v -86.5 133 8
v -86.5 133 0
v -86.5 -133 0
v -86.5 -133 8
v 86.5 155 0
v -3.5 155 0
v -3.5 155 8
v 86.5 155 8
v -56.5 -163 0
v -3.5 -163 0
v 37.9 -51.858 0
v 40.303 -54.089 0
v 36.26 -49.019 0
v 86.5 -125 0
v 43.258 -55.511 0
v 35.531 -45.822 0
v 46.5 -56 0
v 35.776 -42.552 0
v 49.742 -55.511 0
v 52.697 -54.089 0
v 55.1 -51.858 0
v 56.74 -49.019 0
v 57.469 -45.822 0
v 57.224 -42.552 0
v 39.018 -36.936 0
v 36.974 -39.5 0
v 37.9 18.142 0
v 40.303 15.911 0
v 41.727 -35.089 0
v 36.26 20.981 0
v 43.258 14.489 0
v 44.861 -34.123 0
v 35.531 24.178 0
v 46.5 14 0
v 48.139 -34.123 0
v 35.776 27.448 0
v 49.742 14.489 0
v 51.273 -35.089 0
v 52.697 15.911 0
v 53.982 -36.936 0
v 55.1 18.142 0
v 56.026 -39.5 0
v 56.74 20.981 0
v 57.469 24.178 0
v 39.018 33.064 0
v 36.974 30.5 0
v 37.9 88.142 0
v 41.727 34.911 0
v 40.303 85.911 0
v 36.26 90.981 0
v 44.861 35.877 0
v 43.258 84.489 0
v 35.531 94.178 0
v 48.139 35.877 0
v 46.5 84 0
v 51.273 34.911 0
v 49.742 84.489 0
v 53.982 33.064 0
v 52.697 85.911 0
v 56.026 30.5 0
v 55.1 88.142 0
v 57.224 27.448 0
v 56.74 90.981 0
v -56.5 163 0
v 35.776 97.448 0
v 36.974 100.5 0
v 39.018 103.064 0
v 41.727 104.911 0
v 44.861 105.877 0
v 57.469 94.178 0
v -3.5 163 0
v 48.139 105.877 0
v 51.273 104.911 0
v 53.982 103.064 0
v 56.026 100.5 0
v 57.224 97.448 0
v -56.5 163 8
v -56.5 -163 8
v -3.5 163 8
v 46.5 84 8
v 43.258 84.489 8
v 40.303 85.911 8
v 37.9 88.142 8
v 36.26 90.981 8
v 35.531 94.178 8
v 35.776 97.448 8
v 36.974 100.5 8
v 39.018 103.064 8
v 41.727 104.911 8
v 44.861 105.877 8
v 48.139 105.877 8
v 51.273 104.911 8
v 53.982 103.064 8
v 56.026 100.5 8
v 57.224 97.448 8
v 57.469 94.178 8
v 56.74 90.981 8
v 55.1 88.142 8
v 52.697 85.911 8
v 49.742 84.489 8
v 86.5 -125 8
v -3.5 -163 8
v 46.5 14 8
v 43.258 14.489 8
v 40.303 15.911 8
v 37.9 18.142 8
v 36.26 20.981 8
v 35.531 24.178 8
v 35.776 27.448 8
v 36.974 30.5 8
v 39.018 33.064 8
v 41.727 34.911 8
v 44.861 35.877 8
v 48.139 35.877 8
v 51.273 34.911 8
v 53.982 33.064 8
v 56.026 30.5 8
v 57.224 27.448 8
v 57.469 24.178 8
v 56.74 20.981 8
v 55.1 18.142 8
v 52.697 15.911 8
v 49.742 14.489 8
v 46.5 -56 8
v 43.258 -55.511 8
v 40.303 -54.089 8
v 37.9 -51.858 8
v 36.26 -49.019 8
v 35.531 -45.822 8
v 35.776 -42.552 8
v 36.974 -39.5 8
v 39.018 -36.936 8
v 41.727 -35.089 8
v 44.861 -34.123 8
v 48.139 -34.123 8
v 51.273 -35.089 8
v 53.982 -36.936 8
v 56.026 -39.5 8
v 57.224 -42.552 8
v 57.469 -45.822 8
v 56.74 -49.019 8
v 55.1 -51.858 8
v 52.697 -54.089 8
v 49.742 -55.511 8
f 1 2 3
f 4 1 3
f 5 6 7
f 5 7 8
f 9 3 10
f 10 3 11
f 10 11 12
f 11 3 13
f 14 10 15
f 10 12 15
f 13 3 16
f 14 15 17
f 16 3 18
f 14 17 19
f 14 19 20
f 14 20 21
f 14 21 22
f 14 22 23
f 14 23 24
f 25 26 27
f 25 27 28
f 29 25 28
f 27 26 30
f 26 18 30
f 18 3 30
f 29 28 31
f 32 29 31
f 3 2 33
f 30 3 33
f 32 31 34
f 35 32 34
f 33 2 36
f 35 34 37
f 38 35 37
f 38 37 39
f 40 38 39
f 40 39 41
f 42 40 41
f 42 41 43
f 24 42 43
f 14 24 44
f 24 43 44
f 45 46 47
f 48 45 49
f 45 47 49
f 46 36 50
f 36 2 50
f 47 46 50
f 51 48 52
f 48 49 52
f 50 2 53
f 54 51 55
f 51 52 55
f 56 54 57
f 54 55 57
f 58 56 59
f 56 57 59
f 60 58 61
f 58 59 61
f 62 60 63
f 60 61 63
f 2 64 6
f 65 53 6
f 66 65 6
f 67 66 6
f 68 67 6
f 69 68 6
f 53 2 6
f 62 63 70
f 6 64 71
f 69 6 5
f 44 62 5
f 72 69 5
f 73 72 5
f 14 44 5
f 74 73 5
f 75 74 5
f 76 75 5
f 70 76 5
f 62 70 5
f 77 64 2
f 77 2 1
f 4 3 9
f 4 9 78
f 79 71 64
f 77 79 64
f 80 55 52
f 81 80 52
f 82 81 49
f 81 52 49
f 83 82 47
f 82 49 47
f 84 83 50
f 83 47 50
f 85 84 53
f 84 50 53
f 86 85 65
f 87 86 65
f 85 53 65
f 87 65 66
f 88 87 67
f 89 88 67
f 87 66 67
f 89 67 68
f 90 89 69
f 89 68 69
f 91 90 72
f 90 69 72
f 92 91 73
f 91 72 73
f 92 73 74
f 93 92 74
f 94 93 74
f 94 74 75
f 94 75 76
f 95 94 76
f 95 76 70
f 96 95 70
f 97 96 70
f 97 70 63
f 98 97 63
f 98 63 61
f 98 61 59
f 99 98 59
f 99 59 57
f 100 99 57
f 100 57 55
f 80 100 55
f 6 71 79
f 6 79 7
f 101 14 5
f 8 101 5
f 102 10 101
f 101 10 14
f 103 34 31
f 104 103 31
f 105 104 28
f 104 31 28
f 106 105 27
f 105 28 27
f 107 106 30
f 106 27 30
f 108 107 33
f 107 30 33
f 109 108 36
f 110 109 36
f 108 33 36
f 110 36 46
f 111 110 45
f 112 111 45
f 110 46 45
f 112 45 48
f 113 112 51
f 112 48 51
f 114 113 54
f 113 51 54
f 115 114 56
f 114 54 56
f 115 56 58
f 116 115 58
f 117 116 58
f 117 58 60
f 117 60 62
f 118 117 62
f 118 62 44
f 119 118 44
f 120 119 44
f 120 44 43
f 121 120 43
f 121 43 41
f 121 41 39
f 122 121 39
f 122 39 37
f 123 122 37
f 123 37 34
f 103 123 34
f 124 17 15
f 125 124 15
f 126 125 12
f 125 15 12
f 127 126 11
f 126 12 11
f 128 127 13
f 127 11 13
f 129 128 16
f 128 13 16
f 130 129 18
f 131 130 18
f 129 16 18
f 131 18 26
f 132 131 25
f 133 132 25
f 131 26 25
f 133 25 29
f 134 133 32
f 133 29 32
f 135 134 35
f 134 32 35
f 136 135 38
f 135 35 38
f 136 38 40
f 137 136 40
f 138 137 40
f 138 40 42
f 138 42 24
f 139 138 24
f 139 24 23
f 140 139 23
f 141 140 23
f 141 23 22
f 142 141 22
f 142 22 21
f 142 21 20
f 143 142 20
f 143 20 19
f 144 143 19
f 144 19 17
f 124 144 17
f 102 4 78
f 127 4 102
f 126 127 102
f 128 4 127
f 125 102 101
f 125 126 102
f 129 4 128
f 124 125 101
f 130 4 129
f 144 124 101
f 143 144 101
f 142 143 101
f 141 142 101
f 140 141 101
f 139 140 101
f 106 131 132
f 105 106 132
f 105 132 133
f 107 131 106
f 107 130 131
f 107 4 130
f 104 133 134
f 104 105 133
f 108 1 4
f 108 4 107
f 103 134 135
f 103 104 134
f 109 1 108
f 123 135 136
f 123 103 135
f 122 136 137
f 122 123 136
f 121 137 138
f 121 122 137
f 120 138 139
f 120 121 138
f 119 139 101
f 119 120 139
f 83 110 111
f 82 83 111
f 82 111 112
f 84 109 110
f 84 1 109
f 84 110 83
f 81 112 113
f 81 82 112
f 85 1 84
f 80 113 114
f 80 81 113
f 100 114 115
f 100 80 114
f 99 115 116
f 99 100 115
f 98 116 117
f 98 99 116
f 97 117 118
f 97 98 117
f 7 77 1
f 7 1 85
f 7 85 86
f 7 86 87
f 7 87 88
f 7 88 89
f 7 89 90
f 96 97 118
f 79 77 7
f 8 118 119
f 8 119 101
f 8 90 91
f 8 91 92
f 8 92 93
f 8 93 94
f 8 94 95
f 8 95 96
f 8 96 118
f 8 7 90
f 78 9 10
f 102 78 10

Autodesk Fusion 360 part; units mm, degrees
sketch "スケッチ1" plane through (0, 0, 0) normal (0, 0, 1) x (1, 0, 0)
  line L0 (-3.5, 163) -> (-86.5, 163)
  line L1 (-86.5, 163) -> (-86.5, -163)
  line L2 (-86.5, -163) -> (-3.5, -163)
  line L3 (86.5, -125) -> (86.5, 155)
  line L4 (82.2546, 155) -> (-86.5, -163) construction
  line L5 (-86.5, 163) -> (70.0256, -131.9558) construction
  line L6 (-3.5, 163) -> (-3.5, 155)
  line L7 (-3.5, 155) -> (86.5, 155)
  line L8 (-86.5, -163) -> (-3.5, -163) construction
  line L9 (-3.5, -163) -> (86.5, -125)
  dimension "d2" = 326
  dimension "d5" = 83
extrude "押し出し1" add sketch "スケッチ1" along normal blind 8
chamfer "面取り1" distance 30 angle 45 2 edges at (-86.5, -163, 4) (-86.5, 163, 4)
sketch "スケッチ2" plane through (0, 0, 8) normal (0, 0, 1) x (-1, 0, 0)
  line L0 (56.5, -163) -> (86.5, -133)
  line L1 (86.5, -133) -> (86.5, 133)
  line L2 (86.5, 133) -> (56.5, 163)
  line L3 (56.5, 163) -> (3.5, 163)
  line L4 (3.5, 163) -> (-86.5, 125)
  line L5 (-86.5, 125) -> (-86.5, -155)
  line L6 (-86.5, -155) -> (3.5, -155)
  line L7 (3.5, -155) -> (3.5, -163)
  line L8 (3.5, -163) -> (56.5, -163)
  line L9 (-86.5, -155) -> (-46.5, -155) construction
  line L10 (-46.5, -155) -> (-46.5, -95) construction
  line L11 (-46.5, -95) -> (-86.5, -95) construction
  line L12 (-86.5, -95) -> (-86.5, -155) construction
  line L13 (-46.5, -95) -> (-46.5, -25) construction
  line L14 (-46.5, -25) -> (-46.5, 45) construction
  point P0 (-46.5, -95)
  point P1 (-46.5, -25)
  point P2 (-46.5, 45)
  dimension "d10" = 40
  dimension "d11" = 60
  dimension "d12" = 70
  dimension "d13" = 70
hole "穴1" at (46.5, 95, 8) at (46.5, 25, 8) at (46.5, -45, 8) direction (0, 0, -1) diameter 22 end through all
equation "d5 = 30 mm + 53 mm"
